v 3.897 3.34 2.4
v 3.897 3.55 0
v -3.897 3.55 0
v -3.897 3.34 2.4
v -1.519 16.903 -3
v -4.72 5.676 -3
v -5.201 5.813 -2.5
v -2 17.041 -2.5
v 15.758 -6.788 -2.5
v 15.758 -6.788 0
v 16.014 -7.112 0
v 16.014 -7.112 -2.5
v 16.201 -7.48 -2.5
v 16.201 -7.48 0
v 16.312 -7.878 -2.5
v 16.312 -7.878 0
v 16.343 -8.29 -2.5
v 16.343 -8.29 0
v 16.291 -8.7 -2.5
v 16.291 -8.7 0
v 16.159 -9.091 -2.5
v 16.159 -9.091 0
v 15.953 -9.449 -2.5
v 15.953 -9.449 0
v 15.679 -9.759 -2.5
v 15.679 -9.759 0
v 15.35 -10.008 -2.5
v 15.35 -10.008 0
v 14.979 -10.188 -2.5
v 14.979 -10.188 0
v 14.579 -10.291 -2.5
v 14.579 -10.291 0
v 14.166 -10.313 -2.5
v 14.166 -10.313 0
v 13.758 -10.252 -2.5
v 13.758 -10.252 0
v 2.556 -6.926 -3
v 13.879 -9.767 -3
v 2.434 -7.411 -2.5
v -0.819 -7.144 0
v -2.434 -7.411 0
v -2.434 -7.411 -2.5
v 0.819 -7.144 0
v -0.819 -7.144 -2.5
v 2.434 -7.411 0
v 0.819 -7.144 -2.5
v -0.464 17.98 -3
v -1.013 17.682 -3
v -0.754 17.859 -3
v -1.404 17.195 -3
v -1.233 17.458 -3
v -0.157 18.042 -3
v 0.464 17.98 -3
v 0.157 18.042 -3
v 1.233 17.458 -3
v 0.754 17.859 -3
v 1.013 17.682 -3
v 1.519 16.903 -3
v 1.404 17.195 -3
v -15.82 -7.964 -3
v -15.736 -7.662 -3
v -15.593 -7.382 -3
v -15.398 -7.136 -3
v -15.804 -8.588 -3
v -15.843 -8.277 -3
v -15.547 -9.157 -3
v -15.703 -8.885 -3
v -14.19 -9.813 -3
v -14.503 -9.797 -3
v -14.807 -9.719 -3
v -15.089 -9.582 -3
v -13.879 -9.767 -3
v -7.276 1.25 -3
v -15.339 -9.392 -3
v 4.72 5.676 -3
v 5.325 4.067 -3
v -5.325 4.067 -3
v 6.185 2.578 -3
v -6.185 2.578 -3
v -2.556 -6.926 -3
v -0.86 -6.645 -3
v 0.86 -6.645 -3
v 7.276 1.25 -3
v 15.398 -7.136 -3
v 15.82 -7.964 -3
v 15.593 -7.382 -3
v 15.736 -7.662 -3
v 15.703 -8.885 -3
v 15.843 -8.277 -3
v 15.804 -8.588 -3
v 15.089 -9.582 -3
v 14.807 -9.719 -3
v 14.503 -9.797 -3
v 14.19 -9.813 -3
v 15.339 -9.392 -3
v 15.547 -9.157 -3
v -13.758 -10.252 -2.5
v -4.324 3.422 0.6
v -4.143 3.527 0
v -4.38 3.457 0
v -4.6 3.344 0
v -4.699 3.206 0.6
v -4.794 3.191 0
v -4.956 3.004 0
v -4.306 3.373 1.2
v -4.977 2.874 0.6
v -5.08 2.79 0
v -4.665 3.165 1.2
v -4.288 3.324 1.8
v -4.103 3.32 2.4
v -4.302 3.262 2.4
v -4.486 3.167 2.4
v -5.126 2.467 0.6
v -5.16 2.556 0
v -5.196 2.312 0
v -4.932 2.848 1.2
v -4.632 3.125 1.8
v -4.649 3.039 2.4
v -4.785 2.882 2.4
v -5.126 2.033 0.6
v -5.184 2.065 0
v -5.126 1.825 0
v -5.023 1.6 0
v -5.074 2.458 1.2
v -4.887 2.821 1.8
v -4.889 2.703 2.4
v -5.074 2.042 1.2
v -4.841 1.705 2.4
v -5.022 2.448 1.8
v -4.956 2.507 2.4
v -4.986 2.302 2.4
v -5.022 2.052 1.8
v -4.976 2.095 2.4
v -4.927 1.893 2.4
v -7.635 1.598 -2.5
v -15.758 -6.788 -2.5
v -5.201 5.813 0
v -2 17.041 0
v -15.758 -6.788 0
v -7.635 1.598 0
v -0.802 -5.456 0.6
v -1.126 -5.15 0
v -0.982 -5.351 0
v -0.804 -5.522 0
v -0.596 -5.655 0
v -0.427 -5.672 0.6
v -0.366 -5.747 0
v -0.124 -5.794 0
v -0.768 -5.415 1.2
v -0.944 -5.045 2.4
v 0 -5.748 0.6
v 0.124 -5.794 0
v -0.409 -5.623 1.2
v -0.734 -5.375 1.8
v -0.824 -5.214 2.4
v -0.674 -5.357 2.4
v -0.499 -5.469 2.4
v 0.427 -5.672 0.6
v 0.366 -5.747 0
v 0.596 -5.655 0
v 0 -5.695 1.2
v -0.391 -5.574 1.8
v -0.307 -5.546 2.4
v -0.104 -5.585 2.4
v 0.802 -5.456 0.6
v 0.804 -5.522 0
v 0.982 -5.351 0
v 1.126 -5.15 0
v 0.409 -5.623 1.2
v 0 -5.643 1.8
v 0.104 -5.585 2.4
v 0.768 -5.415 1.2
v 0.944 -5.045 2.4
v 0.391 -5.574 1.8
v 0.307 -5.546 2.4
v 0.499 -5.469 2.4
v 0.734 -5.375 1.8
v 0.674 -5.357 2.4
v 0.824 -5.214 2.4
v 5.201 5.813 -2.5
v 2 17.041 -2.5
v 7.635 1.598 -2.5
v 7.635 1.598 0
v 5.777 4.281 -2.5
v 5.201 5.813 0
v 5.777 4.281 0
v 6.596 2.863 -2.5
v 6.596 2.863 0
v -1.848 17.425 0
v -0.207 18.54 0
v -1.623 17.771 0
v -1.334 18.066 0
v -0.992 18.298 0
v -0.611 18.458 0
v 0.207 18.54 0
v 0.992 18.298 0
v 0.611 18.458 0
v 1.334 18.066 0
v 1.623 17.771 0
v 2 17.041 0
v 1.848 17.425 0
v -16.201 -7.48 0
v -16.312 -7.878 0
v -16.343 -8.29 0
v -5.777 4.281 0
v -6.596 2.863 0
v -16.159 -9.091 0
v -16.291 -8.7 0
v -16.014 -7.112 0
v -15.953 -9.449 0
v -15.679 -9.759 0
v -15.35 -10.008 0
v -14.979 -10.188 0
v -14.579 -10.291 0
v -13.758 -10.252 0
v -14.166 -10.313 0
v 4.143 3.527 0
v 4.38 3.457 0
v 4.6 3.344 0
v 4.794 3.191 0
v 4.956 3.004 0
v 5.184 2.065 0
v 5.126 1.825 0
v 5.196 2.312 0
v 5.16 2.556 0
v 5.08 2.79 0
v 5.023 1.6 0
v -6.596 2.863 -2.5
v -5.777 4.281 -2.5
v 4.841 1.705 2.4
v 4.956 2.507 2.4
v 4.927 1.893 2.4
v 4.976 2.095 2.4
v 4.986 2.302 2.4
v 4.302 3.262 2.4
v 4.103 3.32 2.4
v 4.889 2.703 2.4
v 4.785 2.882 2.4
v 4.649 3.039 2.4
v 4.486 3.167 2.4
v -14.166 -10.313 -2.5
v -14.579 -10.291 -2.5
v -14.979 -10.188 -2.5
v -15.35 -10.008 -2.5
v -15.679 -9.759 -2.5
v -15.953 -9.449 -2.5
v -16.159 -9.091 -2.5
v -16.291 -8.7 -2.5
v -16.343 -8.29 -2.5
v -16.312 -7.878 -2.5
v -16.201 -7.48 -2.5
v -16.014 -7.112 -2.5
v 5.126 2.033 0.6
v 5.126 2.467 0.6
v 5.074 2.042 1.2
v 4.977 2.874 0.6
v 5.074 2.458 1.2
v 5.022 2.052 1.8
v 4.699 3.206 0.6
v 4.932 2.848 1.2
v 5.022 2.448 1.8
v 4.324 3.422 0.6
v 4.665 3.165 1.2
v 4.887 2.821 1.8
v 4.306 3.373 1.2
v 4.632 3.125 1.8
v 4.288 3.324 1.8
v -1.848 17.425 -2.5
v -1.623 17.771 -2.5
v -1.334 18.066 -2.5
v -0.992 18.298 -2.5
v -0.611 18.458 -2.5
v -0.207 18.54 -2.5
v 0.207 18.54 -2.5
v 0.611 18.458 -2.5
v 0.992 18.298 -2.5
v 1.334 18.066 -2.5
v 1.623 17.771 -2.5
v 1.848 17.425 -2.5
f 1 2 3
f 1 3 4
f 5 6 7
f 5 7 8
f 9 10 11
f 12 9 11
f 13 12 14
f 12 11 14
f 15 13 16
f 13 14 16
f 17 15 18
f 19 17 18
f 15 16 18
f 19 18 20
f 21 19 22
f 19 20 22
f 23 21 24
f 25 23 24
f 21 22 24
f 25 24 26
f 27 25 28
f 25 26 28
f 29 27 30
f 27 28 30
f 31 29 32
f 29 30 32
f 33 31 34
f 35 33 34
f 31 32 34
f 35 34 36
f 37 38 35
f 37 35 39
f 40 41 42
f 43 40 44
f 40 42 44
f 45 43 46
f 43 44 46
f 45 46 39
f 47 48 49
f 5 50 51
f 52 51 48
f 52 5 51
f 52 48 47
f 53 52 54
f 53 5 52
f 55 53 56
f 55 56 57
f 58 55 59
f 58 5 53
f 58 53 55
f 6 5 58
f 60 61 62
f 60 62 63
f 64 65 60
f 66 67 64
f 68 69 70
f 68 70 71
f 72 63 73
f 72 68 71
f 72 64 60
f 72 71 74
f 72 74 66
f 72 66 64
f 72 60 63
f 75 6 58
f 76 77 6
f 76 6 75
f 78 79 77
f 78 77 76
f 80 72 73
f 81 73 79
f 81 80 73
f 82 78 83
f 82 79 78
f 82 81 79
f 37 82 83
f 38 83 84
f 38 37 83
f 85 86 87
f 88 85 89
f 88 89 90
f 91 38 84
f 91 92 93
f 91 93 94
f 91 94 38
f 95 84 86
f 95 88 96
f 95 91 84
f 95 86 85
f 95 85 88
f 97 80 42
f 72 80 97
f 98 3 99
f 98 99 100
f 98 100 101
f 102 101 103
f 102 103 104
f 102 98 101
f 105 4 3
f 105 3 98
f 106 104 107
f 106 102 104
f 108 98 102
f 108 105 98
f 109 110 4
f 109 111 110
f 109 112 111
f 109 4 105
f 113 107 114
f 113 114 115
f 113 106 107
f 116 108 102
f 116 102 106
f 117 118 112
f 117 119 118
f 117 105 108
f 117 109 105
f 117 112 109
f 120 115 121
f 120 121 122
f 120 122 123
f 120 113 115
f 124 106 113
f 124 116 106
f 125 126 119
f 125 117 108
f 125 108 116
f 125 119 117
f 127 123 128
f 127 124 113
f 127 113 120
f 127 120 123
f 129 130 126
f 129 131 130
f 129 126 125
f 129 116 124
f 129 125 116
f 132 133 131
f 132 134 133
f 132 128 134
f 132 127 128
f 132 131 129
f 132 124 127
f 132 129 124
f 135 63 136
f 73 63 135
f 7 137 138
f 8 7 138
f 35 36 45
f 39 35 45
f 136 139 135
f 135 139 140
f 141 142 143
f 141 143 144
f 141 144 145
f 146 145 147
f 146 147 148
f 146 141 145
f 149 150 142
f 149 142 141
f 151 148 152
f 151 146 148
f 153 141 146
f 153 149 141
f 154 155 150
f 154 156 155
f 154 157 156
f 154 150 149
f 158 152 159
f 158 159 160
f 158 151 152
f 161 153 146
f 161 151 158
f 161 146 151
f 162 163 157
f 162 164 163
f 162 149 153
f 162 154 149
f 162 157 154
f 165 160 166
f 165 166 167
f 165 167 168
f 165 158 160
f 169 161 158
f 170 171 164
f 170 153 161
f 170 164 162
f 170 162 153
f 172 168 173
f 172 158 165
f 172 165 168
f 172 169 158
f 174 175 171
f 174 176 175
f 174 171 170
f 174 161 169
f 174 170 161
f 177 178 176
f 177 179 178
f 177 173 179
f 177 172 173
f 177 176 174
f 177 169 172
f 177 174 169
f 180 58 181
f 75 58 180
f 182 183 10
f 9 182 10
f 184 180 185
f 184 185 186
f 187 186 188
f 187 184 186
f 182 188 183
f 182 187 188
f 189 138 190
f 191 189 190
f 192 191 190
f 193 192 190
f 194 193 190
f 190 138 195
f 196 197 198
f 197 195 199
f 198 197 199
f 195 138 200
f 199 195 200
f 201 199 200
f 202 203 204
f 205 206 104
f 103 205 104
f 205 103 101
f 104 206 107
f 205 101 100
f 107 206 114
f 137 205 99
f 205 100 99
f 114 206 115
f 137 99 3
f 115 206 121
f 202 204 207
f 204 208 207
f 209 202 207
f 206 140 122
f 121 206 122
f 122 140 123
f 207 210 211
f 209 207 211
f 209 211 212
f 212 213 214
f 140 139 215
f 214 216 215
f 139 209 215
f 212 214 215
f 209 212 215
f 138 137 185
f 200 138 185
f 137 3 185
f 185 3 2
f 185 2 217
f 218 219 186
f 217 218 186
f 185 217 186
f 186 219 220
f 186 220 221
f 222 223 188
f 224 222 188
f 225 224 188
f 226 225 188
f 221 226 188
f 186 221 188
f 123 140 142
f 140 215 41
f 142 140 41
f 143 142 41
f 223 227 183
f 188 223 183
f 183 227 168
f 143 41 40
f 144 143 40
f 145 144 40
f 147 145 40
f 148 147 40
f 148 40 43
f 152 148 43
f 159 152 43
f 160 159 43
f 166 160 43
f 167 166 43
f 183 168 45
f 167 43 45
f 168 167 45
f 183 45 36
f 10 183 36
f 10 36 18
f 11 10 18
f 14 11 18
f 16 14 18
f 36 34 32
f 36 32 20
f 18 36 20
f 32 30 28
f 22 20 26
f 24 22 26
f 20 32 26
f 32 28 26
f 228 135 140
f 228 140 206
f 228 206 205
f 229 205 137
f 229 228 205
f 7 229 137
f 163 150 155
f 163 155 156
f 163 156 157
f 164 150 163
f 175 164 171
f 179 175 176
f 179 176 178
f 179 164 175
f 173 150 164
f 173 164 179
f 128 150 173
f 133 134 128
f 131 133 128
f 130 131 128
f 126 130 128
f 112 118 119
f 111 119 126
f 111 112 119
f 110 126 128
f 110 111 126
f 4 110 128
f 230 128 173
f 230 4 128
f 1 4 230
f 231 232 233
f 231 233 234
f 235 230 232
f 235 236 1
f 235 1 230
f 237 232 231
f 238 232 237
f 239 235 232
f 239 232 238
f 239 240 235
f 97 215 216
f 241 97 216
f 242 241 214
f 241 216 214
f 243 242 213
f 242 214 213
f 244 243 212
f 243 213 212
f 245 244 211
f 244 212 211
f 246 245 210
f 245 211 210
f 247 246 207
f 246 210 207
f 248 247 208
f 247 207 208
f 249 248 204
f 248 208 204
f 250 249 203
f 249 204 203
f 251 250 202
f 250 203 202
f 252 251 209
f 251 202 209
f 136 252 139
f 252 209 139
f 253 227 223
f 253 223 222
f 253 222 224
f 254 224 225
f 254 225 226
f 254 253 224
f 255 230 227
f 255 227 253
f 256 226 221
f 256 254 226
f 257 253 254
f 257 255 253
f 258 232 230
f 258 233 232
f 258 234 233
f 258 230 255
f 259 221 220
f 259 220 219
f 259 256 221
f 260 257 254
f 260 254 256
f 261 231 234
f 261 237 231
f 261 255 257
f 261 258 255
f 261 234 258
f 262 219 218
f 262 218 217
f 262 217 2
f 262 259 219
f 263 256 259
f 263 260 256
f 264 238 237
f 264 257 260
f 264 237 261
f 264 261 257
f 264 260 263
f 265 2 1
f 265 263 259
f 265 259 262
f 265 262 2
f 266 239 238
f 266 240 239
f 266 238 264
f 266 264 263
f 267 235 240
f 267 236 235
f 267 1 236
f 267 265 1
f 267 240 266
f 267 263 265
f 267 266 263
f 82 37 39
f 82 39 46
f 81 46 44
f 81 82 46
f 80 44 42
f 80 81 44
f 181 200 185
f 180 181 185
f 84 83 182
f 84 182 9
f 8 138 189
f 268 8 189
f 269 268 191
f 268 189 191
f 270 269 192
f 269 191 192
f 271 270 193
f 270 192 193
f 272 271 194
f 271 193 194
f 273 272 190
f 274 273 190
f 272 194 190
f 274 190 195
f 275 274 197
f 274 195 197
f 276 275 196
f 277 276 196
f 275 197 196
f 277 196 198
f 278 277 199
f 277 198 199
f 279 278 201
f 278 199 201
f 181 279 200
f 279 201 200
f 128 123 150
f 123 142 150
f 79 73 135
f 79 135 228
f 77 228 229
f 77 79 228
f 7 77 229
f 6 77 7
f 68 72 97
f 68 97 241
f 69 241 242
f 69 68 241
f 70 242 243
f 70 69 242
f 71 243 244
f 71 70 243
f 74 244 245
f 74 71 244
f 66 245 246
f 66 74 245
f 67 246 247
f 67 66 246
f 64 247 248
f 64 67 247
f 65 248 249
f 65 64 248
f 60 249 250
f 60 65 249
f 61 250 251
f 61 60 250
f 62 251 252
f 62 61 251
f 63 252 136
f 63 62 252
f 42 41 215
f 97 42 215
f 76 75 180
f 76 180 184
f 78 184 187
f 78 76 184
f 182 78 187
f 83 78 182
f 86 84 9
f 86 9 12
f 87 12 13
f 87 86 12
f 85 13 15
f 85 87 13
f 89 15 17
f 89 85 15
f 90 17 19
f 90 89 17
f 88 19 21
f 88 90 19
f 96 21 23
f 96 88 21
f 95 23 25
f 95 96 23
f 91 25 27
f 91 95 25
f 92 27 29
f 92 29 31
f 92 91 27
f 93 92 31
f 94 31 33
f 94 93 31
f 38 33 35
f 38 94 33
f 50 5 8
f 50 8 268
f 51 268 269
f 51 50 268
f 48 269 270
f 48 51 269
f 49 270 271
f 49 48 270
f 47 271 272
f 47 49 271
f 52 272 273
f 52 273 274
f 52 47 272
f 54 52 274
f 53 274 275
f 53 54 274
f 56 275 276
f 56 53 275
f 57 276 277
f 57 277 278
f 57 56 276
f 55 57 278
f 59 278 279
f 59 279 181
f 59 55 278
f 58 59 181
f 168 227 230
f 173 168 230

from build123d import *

# Parameters (mm, degrees)
F1_DEPTH = 2.4
F1_TAPER = 5
F3_DEPTH = 3
F4_R     = 10
F5_SIZE  = 0.5


with BuildPart() as f1:
    # F0 (on Top) → F1 (new body)
    with BuildSketch(Plane.XY):
        with BuildLine():
            Line((3.897114317, 3.55), (-3.897114317, 3.55))
            ThreePointArc((-3.897114317, 3.55), (-5.0229473419, 2.9), (-5.0229473419, 1.6))
            Line((-5.0229473419, 1.6), (-1.1258330249, -5.15))
            ThreePointArc((-1.1258330249, -5.15), (0, -5.8), (1.1258330249, -5.15))
            Line((1.1258330249, -5.15), (5.0229473419, 1.6))
            ThreePointArc((5.0229473419, 1.6), (5.0229473419, 2.9), (3.897114317, 3.55))
        make_face()
    extrude(amount=F1_DEPTH, taper=F1_TAPER)

    # F2 (on face) → F3 (join)
    with BuildSketch(Plane(origin=(0, 0, 0), x_dir=(1, 0, 0), z_dir=(0, 0, -1))):
        with BuildLine():
            Line((-15.7575166744, 6.788205417), (-5.8889727457, -3.4))
            Line((-5.8889727457, -3.4), (-2, -17.040512449))
            ThreePointArc((-2, -17.040512449), (0, -18.55), (2, -17.040512449))
            Line((2, -17.040512449), (5.8889727457, -3.4))
            Line((5.8889727457, -3.4), (15.7575166744, 6.788205417))
            ThreePointArc((15.7575166744, 6.788205417), (16.0647712402, 9.275), (13.7575166744, 10.2523070321))
            Line((13.7575166744, 10.2523070321), (0, 6.8))
            Line((0, 6.8), (-13.7575166744, 10.2523070321))
            ThreePointArc((-13.7575166744, 10.2523070321), (-16.0647712402, 9.275), (-15.7575166744, 6.788205417))
        make_face()
    extrude(amount=F3_DEPTH)

    # F4
    f4_edges = [f1.edges().sort_by_distance(p)[0] for p in [
        (0, -6.8, -1.5),
        (5.888973, 3.4, -1.5),
        (-5.888973, 3.4, -1.5),
    ]]
    fillet(f4_edges, radius=F4_R)

    # F5
    f5_edges = [f1.edges().sort_by_distance(p)[0] for p in [
        (-11.696199, -2.595334, -3),
        (-6.157481, 3.555024, -3),
        (-16.064771, -9.275, -3),
        (-3.600474, 11.426873, -3),
        (-8.095725, -8.831539, -3),
        (0, 18.55, -3),
        (0, -7.110047, -3),
        (3.600474, 11.426873, -3),
        (8.095725, -8.831539, -3),
        (6.157481, 3.555024, -3),
        (16.064771, -9.275, -3),
        (11.696199, -2.595334, -3),
    ]]
    chamfer(f5_edges, length=F5_SIZE)


solid = f1.part
